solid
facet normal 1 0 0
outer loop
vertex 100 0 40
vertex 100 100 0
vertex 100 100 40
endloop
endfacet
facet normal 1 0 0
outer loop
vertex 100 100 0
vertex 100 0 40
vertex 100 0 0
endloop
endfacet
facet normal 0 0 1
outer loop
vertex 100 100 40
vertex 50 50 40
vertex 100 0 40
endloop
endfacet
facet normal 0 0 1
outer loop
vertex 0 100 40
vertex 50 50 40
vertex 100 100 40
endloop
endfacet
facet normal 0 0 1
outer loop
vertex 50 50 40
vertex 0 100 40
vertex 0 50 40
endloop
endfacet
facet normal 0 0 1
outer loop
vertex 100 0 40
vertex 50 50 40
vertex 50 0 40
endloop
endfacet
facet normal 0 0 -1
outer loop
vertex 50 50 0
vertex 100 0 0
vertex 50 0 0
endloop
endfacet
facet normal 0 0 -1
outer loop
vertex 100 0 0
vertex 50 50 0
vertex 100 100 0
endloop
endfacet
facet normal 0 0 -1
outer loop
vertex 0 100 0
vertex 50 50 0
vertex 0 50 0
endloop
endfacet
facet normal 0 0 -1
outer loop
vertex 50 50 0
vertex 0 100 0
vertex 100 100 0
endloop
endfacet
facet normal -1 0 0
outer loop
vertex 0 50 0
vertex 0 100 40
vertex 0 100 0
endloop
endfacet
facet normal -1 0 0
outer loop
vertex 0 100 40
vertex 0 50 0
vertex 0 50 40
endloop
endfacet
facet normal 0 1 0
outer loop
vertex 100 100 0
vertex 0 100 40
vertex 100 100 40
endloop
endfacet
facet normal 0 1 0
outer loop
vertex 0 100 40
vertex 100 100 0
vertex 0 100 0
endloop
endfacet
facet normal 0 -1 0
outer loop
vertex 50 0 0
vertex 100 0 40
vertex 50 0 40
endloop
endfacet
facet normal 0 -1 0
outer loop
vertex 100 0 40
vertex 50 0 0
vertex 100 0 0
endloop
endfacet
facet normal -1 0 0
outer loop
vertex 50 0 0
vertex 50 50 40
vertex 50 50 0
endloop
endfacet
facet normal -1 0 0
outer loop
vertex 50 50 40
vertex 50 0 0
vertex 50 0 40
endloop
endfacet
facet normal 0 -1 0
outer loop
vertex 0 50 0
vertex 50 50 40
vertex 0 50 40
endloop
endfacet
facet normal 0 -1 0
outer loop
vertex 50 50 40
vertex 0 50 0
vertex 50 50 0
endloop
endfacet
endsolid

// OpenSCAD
module stand(length, width, thickness) { 

    difference () {

        cube ( [ length, width, thickness ] ) ;
        /*You have 5's hardcoded here, but that has
        nothing per se to do with whatever arguments you send
        to the parameters length, width, and thickness.*/
        translate ( [ 5, 5, 0] ) {
            cylinder (r = 0.5, h = 1, $fn = 30) ;

        }
    }

}

/*If you put this here, and then do a difference of it with 
something else, the difference is not going to render.
This is basic addition and subtraction:

stand100 + (stand100 - stand50) = stand100*/
//stand (100, 100, 40) ;


/*Assuming this difference is what you were really after,
the fact that your cubes are not centered means you get an "L"
shapped stand.  Is this intentional?  Your lack of commenting
does not make this clear.*/
difference () { 

    stand (100, 100, 40) ; 
    stand (50, 50, 80) ;

   

}
